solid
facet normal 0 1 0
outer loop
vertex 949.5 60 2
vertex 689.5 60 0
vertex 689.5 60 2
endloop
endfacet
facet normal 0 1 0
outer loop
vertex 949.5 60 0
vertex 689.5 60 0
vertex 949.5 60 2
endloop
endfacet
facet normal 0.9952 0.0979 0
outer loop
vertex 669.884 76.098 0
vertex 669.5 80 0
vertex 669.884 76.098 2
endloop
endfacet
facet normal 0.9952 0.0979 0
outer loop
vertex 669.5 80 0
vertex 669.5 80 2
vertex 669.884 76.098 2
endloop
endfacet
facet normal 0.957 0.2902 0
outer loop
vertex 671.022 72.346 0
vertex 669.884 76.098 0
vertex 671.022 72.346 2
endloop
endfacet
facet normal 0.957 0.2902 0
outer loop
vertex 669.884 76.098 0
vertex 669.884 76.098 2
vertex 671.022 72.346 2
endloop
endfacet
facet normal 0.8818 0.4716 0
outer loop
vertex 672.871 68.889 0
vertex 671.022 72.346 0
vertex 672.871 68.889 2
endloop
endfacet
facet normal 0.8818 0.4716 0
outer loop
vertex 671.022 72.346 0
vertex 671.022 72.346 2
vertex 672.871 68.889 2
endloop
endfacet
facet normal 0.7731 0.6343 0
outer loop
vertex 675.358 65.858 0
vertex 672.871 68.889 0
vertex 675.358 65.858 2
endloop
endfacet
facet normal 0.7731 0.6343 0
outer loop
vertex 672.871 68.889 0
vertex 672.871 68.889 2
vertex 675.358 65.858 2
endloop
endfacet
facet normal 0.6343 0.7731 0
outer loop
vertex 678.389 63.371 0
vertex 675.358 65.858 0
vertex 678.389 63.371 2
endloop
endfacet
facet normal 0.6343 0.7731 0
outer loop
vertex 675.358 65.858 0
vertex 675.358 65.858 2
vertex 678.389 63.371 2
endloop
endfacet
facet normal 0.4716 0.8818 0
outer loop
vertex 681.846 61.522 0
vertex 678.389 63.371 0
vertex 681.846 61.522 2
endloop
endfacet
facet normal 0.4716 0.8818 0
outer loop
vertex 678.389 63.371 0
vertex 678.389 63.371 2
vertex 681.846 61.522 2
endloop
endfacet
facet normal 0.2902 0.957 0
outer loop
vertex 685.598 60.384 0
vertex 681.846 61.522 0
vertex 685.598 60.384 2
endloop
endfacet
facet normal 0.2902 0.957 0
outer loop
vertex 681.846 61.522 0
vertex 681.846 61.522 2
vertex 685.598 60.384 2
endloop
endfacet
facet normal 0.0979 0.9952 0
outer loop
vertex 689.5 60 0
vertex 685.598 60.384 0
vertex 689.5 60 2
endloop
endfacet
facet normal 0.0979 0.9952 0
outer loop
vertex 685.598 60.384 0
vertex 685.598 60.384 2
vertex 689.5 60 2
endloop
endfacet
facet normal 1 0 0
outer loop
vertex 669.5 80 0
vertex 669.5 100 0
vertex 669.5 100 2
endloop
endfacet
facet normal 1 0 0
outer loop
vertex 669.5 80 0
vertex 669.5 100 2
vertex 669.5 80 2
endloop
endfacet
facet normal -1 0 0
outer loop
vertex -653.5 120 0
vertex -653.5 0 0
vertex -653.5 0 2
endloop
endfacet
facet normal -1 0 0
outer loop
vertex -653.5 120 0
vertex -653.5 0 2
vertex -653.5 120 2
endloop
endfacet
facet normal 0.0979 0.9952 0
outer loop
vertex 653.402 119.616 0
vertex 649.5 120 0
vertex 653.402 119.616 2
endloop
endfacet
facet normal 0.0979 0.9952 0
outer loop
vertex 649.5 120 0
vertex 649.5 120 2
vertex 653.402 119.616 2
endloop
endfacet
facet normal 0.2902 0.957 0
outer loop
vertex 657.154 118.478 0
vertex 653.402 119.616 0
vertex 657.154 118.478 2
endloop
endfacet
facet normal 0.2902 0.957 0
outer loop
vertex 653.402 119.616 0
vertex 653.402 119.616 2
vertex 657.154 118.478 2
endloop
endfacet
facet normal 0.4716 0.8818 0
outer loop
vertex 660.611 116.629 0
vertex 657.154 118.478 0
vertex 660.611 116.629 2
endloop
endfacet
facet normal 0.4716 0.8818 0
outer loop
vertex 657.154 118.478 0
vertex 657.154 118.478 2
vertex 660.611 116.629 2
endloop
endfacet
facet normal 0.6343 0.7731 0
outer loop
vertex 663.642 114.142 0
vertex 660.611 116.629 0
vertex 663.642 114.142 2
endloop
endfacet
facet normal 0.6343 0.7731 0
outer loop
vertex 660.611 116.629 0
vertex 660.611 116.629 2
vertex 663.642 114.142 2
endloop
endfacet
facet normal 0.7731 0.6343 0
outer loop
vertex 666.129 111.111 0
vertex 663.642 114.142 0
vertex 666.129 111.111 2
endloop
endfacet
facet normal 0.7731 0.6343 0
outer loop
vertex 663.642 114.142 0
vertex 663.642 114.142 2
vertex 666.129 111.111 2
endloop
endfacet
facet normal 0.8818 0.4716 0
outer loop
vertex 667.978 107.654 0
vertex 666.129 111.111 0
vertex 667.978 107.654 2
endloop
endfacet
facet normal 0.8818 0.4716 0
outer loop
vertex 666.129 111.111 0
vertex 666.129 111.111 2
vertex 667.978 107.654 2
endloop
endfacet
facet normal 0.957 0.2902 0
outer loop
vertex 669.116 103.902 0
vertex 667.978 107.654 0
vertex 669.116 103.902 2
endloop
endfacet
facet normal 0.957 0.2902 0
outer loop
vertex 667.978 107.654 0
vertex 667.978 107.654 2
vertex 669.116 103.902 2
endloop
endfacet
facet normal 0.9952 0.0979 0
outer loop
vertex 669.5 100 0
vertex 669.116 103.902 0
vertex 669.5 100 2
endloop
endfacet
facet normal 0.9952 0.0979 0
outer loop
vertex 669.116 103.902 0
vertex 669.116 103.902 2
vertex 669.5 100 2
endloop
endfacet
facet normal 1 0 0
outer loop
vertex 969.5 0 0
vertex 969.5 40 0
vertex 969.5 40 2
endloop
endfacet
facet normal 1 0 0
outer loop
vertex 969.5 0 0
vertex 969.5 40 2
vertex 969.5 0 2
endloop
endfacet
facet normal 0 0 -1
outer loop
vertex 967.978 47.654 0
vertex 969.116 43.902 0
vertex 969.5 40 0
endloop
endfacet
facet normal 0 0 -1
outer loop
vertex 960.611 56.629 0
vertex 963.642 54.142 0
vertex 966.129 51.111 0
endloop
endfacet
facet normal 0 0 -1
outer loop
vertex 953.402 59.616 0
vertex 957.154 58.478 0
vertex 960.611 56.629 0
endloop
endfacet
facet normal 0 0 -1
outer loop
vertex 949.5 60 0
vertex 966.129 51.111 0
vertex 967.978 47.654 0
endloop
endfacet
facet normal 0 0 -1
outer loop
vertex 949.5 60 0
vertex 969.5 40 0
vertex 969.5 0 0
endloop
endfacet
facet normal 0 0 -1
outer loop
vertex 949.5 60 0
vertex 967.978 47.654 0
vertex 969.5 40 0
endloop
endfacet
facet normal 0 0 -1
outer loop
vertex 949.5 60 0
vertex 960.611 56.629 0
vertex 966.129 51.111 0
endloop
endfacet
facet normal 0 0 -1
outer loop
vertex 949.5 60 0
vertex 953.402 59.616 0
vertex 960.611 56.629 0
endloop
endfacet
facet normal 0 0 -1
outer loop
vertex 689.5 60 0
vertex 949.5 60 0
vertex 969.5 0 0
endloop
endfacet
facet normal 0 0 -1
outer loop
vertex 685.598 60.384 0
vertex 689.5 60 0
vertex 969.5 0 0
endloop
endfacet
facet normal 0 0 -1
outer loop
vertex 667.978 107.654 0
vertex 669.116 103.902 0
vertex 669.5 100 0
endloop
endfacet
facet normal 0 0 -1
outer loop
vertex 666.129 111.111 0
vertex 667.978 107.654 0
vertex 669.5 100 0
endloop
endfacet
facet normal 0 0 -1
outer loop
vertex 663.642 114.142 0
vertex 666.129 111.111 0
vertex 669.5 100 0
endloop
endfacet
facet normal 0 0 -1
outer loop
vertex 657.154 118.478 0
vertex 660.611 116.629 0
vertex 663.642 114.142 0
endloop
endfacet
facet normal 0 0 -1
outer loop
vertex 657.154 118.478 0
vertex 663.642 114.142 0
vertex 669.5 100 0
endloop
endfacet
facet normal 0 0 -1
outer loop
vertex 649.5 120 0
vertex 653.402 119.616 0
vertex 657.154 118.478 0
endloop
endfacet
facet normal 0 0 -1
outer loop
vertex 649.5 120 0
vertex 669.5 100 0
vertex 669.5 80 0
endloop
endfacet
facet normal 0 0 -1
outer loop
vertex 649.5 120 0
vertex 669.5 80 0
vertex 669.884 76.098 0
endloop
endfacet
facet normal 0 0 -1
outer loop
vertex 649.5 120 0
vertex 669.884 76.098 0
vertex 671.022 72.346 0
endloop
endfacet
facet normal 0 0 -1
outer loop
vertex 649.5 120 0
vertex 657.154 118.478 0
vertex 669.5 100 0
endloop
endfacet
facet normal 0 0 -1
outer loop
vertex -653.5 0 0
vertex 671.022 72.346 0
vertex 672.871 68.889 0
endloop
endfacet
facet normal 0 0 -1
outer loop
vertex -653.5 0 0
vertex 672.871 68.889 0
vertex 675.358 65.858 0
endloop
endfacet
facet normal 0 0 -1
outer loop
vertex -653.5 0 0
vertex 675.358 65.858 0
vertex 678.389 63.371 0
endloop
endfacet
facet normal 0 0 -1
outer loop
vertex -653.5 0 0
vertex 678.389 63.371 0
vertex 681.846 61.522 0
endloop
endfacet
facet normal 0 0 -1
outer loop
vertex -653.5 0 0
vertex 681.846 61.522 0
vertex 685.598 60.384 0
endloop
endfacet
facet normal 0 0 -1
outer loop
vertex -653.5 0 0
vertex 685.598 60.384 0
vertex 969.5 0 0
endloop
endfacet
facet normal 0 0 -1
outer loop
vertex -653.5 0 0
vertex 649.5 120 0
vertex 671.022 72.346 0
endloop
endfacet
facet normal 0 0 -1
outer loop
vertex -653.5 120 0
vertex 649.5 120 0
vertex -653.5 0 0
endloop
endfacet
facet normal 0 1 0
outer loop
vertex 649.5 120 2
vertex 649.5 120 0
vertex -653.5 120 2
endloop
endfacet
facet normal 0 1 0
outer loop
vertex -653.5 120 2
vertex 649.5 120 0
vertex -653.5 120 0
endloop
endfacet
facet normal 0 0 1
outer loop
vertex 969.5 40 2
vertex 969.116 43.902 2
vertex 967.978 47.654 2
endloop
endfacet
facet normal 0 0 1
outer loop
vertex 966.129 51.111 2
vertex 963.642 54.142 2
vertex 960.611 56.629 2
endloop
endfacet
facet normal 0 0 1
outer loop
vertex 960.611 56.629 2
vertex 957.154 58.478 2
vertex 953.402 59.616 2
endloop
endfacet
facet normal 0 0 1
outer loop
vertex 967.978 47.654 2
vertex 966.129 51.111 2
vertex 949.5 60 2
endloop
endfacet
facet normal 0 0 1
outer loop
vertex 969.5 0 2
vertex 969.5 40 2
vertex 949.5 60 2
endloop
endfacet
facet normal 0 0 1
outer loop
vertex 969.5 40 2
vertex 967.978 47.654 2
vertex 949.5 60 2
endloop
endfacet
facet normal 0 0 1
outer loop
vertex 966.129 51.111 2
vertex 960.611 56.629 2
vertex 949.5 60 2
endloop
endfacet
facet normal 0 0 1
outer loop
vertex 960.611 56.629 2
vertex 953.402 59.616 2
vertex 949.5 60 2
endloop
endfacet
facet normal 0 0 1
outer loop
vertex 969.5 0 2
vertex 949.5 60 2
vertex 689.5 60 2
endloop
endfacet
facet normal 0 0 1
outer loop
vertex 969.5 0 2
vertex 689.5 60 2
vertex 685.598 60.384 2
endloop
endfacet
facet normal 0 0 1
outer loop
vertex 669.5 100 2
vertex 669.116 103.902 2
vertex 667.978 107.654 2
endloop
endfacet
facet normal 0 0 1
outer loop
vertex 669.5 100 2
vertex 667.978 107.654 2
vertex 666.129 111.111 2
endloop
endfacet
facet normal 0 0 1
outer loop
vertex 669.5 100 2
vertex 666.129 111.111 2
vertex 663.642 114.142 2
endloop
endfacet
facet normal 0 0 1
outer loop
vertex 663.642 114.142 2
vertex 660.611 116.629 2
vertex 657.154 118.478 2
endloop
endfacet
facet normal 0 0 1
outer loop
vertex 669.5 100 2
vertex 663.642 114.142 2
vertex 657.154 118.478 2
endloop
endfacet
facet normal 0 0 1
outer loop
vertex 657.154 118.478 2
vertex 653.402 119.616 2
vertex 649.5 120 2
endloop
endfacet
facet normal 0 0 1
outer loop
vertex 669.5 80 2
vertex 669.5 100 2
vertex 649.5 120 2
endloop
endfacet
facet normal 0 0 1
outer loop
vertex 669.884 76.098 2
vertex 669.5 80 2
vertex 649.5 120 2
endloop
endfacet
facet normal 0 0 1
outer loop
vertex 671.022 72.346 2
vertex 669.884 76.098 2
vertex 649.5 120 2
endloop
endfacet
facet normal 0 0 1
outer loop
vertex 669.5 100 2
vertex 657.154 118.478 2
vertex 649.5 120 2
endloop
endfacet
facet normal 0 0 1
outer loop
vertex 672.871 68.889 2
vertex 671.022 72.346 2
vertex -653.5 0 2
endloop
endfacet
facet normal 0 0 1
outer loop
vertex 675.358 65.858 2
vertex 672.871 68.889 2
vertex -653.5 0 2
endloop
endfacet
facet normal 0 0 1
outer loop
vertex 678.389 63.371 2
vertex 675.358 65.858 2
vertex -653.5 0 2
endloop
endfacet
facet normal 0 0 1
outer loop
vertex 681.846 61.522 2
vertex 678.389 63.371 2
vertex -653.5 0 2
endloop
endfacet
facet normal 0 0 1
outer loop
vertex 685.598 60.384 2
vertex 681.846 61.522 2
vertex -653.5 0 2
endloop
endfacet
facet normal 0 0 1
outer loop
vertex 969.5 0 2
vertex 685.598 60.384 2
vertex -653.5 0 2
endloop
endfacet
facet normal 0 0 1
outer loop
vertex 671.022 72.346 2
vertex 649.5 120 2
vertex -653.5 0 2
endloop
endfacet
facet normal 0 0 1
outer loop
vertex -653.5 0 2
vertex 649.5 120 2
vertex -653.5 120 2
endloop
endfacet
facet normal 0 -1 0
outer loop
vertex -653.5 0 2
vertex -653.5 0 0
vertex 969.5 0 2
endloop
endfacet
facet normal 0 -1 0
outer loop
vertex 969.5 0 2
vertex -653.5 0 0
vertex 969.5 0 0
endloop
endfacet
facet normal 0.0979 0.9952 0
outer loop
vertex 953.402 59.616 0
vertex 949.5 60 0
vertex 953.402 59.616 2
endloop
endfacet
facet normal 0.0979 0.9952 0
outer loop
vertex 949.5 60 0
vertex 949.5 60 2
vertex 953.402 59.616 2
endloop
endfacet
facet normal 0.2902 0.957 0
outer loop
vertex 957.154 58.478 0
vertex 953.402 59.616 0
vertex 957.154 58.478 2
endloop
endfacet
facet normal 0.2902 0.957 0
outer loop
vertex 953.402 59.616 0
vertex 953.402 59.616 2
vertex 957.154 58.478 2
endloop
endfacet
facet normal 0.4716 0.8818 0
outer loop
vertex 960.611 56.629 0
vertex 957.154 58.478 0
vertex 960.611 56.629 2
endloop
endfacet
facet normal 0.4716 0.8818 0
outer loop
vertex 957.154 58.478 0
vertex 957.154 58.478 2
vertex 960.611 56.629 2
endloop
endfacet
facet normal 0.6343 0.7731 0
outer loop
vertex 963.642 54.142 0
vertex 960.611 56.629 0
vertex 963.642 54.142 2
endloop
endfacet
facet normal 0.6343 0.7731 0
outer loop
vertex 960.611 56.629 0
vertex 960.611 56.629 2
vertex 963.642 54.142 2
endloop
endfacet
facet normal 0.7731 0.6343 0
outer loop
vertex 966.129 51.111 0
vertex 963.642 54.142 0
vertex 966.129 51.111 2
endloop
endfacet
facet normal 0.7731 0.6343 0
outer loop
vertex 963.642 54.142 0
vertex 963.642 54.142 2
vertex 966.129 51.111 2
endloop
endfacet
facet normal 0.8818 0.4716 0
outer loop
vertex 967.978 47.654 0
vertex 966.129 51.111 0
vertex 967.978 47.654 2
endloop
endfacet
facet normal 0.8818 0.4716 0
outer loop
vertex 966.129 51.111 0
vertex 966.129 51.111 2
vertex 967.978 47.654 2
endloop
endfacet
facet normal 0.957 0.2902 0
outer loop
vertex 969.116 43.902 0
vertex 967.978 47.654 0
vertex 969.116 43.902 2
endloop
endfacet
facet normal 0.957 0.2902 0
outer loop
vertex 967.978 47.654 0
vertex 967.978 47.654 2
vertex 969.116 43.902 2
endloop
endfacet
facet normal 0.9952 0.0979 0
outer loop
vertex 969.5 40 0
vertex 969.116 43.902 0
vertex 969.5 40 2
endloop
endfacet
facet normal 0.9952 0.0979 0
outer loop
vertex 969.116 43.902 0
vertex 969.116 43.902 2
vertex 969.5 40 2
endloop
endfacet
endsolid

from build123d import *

# Parameters (mm, degrees)
BOSS_EXTRU_1_DEPTH = 2
CONG_1_R           = 20


with BuildPart() as part:
    # Esquisse1 → Boss.-Extru.1 (new body)
    with BuildSketch(Plane.XY):
        Polygon((653.5, 120), (669.5, 120), (669.5, 60), (969.5, 60), (969.5, 0), (653.5, 0), (-653.5, 0), (-653.5, 120), align=None)
    extrude(amount=BOSS_EXTRU_1_DEPTH)

    # Congé1
    cong_1_edges = [part.edges().sort_by_distance(p)[0] for p in [
        (669.5, 120, 1),
        (669.5, 60, 1),
        (969.5, 60, 1),
    ]]
    fillet(cong_1_edges, radius=CONG_1_R)


solid = part.part
